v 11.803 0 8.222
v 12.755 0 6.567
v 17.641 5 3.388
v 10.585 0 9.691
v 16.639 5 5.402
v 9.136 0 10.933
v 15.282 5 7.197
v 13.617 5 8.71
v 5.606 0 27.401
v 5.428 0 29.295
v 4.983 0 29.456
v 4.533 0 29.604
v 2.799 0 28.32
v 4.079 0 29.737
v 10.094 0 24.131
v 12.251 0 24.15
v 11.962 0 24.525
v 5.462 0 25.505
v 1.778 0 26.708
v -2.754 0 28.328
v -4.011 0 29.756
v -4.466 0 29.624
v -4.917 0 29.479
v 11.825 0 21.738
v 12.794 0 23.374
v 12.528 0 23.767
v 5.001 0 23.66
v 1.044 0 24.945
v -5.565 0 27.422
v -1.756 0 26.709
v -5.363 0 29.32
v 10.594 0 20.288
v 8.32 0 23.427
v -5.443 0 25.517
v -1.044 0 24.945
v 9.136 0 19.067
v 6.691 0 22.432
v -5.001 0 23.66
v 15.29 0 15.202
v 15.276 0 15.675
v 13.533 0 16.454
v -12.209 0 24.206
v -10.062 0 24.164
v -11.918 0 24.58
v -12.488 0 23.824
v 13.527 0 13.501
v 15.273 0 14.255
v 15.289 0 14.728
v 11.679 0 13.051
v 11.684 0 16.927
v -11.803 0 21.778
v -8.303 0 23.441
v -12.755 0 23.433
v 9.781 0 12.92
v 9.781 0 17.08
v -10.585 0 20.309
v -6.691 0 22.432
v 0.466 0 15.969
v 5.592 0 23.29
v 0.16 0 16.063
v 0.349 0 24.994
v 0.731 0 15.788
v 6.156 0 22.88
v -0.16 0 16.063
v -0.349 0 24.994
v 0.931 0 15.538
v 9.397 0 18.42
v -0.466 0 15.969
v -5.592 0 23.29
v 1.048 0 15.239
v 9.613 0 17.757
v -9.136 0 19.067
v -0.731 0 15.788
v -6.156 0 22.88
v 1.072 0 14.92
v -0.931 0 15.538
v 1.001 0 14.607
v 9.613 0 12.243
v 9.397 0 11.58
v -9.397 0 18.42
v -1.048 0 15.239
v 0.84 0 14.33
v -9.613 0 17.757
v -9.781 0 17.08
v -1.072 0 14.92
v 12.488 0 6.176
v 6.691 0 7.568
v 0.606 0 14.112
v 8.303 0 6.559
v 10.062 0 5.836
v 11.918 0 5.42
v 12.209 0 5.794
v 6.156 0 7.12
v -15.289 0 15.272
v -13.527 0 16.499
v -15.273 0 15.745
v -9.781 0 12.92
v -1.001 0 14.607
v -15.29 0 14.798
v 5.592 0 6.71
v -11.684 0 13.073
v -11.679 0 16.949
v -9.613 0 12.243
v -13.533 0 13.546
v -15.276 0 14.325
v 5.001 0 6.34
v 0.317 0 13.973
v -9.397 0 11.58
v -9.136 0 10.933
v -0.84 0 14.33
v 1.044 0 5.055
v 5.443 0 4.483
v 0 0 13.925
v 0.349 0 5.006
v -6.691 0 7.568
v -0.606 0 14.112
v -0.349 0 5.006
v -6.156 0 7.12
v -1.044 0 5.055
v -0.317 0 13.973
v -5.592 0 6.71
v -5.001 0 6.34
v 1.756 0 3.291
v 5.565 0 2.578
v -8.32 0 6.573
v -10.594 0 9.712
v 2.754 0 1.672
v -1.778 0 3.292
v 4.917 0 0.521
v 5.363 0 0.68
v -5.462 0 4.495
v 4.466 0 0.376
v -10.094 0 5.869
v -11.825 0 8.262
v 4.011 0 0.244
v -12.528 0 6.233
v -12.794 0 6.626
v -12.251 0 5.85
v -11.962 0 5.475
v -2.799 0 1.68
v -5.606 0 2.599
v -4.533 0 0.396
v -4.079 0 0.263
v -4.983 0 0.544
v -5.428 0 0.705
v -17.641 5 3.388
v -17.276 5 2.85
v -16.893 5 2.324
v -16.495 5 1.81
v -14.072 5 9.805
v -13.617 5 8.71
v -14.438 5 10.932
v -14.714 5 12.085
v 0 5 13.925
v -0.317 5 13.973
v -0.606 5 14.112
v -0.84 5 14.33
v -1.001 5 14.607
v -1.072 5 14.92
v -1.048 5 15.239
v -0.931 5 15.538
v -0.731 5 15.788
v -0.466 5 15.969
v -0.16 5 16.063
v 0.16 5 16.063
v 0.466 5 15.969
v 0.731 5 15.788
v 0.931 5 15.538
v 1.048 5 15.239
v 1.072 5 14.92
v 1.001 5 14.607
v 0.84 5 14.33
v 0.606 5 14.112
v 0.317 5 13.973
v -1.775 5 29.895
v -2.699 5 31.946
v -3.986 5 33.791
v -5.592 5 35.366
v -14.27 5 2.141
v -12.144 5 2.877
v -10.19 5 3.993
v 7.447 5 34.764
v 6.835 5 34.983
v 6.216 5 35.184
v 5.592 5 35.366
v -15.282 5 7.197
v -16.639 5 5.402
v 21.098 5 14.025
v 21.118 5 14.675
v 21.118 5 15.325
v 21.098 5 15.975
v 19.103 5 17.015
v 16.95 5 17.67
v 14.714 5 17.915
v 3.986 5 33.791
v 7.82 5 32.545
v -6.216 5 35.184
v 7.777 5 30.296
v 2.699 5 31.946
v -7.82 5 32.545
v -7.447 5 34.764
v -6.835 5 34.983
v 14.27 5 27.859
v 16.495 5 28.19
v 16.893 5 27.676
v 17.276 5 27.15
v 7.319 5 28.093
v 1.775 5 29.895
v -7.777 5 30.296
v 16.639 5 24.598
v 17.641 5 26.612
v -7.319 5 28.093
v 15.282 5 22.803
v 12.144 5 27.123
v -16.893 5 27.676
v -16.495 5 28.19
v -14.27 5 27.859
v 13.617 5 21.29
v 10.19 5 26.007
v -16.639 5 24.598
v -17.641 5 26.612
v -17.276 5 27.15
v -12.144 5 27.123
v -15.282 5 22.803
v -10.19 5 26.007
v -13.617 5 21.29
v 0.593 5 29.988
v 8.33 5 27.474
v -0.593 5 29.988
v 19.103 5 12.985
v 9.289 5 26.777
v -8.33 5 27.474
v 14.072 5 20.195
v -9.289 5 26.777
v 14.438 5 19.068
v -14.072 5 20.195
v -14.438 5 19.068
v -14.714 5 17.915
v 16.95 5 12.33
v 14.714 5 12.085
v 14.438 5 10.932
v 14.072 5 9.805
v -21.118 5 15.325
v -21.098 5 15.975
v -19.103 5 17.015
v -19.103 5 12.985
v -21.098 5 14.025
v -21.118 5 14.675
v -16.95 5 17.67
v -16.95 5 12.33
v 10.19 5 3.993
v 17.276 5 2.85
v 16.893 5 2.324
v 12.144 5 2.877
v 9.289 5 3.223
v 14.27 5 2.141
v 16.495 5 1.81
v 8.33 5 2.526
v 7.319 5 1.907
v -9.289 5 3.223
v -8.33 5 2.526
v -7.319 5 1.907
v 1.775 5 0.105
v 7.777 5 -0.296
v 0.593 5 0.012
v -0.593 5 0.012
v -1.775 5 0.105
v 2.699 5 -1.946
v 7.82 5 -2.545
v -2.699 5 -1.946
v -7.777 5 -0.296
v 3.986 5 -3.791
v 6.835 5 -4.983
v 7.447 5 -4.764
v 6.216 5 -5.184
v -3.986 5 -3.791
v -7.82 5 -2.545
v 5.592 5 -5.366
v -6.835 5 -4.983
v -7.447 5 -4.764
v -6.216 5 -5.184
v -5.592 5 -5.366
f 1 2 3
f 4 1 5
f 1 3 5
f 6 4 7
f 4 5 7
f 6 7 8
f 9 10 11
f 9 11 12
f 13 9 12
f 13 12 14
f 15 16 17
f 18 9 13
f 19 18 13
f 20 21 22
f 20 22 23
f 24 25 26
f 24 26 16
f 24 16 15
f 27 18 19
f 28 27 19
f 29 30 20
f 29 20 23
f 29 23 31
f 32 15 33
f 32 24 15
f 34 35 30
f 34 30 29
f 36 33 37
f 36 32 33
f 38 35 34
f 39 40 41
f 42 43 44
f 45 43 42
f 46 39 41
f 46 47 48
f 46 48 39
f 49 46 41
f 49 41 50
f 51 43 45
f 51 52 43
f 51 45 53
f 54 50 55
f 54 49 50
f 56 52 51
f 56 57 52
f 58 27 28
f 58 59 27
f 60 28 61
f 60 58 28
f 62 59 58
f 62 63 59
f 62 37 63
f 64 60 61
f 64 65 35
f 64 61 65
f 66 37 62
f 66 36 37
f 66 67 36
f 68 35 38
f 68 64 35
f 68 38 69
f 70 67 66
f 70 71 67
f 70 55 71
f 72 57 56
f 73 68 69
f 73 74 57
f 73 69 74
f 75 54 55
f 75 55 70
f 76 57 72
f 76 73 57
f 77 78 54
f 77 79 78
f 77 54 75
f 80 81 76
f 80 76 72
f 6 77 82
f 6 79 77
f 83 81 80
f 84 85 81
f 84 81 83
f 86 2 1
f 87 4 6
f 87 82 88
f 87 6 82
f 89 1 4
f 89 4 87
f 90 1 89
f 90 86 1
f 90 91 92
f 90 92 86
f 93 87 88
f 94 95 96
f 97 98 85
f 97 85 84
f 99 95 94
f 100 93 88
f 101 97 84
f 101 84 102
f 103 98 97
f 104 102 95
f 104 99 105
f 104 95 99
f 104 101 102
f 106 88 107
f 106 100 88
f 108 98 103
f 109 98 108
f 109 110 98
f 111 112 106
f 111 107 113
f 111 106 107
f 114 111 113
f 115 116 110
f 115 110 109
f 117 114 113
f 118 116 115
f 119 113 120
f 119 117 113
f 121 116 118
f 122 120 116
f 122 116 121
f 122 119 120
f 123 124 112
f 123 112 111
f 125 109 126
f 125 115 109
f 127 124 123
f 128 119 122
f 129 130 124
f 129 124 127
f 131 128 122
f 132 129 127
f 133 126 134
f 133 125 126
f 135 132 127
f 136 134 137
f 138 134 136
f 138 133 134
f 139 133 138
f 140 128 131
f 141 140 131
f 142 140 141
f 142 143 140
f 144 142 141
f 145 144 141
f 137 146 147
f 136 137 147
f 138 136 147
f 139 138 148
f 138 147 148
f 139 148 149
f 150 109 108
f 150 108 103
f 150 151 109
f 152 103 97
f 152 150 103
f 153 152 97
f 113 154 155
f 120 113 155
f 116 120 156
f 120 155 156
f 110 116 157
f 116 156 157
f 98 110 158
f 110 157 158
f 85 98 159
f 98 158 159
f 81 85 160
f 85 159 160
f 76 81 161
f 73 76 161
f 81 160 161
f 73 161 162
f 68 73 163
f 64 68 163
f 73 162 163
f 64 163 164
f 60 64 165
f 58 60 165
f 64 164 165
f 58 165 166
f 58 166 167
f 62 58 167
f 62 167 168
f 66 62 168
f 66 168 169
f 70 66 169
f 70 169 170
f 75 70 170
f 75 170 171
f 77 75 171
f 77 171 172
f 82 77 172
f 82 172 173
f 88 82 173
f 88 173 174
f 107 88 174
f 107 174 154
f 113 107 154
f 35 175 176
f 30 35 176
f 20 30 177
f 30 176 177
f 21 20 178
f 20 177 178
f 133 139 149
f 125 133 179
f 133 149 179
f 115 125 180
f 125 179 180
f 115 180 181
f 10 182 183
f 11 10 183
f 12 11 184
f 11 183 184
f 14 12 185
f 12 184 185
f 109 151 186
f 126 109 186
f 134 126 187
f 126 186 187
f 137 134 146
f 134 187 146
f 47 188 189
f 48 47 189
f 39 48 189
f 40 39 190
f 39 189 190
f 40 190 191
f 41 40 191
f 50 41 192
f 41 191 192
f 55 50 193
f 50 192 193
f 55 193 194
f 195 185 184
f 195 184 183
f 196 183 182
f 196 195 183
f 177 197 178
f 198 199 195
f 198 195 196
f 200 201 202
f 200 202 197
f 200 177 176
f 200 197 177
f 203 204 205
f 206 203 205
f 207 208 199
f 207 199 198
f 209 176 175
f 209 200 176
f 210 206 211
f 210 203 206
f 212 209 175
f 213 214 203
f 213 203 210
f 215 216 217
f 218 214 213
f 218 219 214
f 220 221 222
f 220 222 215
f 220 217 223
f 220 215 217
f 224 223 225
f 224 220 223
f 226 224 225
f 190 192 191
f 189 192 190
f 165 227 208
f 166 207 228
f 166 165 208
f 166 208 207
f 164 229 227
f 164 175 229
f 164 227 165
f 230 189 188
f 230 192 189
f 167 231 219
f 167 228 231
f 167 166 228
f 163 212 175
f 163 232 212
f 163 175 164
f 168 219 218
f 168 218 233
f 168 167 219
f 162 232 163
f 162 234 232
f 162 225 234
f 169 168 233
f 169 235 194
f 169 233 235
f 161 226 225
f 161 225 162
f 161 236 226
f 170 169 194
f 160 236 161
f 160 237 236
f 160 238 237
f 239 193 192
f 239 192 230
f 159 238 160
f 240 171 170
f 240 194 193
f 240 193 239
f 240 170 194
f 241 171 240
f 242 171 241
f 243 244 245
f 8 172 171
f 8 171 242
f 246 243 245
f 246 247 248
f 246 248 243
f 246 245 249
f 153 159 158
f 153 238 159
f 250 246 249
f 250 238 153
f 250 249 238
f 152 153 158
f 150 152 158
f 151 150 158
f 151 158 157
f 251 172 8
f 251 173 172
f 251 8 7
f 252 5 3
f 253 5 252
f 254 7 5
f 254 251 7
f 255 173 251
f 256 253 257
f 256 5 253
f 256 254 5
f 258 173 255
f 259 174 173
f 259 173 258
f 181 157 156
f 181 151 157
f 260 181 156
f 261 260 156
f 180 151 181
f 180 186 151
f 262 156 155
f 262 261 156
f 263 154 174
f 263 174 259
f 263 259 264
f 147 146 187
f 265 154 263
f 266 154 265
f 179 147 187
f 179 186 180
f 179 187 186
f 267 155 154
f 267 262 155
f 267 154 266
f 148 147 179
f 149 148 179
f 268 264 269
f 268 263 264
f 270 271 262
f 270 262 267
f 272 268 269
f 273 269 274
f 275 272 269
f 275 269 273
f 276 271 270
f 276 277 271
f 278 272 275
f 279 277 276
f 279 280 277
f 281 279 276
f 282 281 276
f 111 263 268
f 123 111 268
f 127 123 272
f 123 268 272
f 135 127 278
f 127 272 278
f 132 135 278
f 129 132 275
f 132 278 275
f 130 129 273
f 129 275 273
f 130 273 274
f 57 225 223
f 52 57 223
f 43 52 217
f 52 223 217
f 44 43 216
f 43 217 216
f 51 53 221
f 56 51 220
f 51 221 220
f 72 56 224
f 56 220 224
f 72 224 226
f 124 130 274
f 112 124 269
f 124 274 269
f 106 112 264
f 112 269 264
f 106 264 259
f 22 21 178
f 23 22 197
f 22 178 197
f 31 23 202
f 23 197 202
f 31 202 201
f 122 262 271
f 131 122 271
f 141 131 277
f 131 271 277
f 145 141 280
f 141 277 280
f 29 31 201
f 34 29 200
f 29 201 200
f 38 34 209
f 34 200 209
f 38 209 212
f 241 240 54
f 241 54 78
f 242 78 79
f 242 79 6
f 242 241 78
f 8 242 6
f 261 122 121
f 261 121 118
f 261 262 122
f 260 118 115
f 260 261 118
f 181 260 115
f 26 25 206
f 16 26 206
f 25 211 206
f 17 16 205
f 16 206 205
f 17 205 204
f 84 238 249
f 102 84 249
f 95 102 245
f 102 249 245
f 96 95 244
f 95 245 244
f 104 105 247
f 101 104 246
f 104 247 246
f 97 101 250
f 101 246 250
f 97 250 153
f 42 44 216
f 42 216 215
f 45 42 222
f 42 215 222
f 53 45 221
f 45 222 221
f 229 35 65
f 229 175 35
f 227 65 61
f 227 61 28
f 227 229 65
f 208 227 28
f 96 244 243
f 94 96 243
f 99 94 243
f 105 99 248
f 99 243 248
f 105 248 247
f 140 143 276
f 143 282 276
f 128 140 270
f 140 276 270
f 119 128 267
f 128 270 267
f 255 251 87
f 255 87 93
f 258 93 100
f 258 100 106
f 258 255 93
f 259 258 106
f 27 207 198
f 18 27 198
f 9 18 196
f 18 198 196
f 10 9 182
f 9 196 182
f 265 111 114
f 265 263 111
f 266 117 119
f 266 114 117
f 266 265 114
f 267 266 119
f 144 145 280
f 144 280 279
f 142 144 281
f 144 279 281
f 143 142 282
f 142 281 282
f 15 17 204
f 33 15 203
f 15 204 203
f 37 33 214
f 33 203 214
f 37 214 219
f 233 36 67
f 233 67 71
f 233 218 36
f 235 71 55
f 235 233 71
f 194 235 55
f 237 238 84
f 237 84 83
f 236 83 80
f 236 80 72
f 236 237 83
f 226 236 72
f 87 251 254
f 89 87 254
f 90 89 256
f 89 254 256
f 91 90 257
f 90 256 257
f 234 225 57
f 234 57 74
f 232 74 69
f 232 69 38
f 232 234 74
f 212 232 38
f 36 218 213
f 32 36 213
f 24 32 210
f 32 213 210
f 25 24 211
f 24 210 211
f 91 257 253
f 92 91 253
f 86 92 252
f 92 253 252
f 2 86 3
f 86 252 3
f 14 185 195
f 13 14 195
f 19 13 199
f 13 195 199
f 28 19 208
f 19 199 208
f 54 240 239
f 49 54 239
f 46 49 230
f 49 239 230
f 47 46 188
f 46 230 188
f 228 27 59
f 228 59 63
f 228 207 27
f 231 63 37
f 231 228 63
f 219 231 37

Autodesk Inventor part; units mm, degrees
ref_plane "YZ Plane" through (0, 0, 0) normal (1, 0, 0) x (0, 1, 0)
ref_plane "XZ Plane" through (0, 0, 0) normal (0, 1, 0) x (-1, 0, 0)
ref_plane "XY Plane" through (0, 0, 0) normal (0, 0, 1) x (1, 0, 0)
ref_plane "Work Plane1" through (0, 0, 0) normal (1, 0, 0) x (0, 1, 0)
sketch "Sketch1" plane through (0, 0, 0) normal (1, 0, 0) x (0, 1, 0)
  line L0 (0, 0) -> (5, 0) construction
  line L1 (5, 0) -> (5, 5)
  line L2 (0, 5) -> (0, 0) construction
  line L3 (0, 5) -> (5, 0)
  line L4 (0, 5) -> (5, 5)
  line L5 (5, 0) -> (0, 0) construction
  line L6 (0, 0) -> (0, 30)
  line L7 (0, 30) -> (5, 30) construction
  line L8 (5, 30) -> (5, 0)
  line L9 (0, 30) -> (5, 30)
  line L10 (5, 30) -> (5, 25)
  line L11 (5, 25) -> (0, 25)
  line L12 (0, 25) -> (0, 30)
  line L13 (0, 25) -> (5, 30)
  line L14 (0, 15) -> (5, 15) construction
  line L15 (0, 13.925) -> (5, 13.925)
  line L16 (5, 13.925) -> (5, 16.075)
  line L17 (5, 16.075) -> (0, 16.075)
  line L18 (0, 16.075) -> (0, 13.925)
  point P0 (10, 5)
  point P1 (0, 16.075)
  point P2 (0, 25)
  dimension "d4" = 5
  dimension "d10" = 30
  dimension "d11" = 5
  dimension "d12" = 5
  dimension "d13" = 5
  dimension "d14" = 5
  dimension "d15" = 1.075
  dimension "d16" = 2.15
revolve "Revolution1" add sketch "Sketch1" angle 360 about axis through (0, 0, 15) along (0, 1, 0) contours L3 L4 L1 | L4 L6 L15 L8 | L17 L6 L11 L8 | L11 L13 L8
sketch "Sketch2" plane through (0, 0, 15) normal (0, -1, 0) x (1, 0, 0)
  arc A0 (0, 1.075) -> (0, -1.075) centre (0, 0) ccw projected
  arc A1 (0, 10) -> (0, -10) centre (0, 0) ccw construction
  arc A2 (-9.7813, 2.08) -> (-9.7813, -2.08) centre (0, 0) ccw
  arc A3 (-15.2728, 0.745) -> (-15.2761, -0.675) centre (0, 0) ccw
  arc A4 (-15.2761, -0.675) -> (-9.7813, -2.08) centre (-9.8343, 9.1599) ccw
  arc A5 (-9.7813, 2.08) -> (-15.2728, 0.745) centre (-9.9572, -9.1586) ccw
  point P0 (0, -15)
  dimension "d17" = 4.16
  dimension "d18" = 2.08
  dimension "d21" = 0.745
  dimension "d22" = 1.42
  dimension "d23" = 15.291
  dimension "d24" = 11.24
  dimension "d25" = 11.24
sketch "Sketch3" plane through (0, 5, 15) normal (0, 1, 0) x (1, 0, 0)
  arc A0 (0, 1.075) -> (0, -1.075) centre (0, 0) ccw projected
  arc A1 (0, 15) -> (0, -15) centre (0, 0) ccw projected
  arc A2 (-14.714, 2.915) -> (-14.714, -2.915) centre (0, 0) ccw
  arc A3 (-21.0975, 0.975) -> (-21.0975, -0.975) centre (0, 0) ccw
  arc A4 (-21.0975, -0.975) -> (-14.714, -2.915) centre (-14.5146, 9.2134) ccw
  arc A5 (-14.714, 2.915) -> (-21.0975, 0.975) centre (-14.5146, -9.2134) ccw
  dimension "d26" = 2.915
  dimension "d27" = 5.83
  dimension "d29" = 0.975
  dimension "d30" = 1.95
  dimension "d31" = 15
  dimension "d32" = 21.12
  dimension "d33" = 12.13
  dimension "d34" = 12.13
loft "Loft1" add profiles "Sketch2", "Sketch3"
pattern_circular "Circular Pattern1" count 10 over 360 about axis through (0, 2.5, 15) along (0, 1, 0) of "Loft1"
equation "\"t\" = 0.15"
properties part number "bevelGear"
